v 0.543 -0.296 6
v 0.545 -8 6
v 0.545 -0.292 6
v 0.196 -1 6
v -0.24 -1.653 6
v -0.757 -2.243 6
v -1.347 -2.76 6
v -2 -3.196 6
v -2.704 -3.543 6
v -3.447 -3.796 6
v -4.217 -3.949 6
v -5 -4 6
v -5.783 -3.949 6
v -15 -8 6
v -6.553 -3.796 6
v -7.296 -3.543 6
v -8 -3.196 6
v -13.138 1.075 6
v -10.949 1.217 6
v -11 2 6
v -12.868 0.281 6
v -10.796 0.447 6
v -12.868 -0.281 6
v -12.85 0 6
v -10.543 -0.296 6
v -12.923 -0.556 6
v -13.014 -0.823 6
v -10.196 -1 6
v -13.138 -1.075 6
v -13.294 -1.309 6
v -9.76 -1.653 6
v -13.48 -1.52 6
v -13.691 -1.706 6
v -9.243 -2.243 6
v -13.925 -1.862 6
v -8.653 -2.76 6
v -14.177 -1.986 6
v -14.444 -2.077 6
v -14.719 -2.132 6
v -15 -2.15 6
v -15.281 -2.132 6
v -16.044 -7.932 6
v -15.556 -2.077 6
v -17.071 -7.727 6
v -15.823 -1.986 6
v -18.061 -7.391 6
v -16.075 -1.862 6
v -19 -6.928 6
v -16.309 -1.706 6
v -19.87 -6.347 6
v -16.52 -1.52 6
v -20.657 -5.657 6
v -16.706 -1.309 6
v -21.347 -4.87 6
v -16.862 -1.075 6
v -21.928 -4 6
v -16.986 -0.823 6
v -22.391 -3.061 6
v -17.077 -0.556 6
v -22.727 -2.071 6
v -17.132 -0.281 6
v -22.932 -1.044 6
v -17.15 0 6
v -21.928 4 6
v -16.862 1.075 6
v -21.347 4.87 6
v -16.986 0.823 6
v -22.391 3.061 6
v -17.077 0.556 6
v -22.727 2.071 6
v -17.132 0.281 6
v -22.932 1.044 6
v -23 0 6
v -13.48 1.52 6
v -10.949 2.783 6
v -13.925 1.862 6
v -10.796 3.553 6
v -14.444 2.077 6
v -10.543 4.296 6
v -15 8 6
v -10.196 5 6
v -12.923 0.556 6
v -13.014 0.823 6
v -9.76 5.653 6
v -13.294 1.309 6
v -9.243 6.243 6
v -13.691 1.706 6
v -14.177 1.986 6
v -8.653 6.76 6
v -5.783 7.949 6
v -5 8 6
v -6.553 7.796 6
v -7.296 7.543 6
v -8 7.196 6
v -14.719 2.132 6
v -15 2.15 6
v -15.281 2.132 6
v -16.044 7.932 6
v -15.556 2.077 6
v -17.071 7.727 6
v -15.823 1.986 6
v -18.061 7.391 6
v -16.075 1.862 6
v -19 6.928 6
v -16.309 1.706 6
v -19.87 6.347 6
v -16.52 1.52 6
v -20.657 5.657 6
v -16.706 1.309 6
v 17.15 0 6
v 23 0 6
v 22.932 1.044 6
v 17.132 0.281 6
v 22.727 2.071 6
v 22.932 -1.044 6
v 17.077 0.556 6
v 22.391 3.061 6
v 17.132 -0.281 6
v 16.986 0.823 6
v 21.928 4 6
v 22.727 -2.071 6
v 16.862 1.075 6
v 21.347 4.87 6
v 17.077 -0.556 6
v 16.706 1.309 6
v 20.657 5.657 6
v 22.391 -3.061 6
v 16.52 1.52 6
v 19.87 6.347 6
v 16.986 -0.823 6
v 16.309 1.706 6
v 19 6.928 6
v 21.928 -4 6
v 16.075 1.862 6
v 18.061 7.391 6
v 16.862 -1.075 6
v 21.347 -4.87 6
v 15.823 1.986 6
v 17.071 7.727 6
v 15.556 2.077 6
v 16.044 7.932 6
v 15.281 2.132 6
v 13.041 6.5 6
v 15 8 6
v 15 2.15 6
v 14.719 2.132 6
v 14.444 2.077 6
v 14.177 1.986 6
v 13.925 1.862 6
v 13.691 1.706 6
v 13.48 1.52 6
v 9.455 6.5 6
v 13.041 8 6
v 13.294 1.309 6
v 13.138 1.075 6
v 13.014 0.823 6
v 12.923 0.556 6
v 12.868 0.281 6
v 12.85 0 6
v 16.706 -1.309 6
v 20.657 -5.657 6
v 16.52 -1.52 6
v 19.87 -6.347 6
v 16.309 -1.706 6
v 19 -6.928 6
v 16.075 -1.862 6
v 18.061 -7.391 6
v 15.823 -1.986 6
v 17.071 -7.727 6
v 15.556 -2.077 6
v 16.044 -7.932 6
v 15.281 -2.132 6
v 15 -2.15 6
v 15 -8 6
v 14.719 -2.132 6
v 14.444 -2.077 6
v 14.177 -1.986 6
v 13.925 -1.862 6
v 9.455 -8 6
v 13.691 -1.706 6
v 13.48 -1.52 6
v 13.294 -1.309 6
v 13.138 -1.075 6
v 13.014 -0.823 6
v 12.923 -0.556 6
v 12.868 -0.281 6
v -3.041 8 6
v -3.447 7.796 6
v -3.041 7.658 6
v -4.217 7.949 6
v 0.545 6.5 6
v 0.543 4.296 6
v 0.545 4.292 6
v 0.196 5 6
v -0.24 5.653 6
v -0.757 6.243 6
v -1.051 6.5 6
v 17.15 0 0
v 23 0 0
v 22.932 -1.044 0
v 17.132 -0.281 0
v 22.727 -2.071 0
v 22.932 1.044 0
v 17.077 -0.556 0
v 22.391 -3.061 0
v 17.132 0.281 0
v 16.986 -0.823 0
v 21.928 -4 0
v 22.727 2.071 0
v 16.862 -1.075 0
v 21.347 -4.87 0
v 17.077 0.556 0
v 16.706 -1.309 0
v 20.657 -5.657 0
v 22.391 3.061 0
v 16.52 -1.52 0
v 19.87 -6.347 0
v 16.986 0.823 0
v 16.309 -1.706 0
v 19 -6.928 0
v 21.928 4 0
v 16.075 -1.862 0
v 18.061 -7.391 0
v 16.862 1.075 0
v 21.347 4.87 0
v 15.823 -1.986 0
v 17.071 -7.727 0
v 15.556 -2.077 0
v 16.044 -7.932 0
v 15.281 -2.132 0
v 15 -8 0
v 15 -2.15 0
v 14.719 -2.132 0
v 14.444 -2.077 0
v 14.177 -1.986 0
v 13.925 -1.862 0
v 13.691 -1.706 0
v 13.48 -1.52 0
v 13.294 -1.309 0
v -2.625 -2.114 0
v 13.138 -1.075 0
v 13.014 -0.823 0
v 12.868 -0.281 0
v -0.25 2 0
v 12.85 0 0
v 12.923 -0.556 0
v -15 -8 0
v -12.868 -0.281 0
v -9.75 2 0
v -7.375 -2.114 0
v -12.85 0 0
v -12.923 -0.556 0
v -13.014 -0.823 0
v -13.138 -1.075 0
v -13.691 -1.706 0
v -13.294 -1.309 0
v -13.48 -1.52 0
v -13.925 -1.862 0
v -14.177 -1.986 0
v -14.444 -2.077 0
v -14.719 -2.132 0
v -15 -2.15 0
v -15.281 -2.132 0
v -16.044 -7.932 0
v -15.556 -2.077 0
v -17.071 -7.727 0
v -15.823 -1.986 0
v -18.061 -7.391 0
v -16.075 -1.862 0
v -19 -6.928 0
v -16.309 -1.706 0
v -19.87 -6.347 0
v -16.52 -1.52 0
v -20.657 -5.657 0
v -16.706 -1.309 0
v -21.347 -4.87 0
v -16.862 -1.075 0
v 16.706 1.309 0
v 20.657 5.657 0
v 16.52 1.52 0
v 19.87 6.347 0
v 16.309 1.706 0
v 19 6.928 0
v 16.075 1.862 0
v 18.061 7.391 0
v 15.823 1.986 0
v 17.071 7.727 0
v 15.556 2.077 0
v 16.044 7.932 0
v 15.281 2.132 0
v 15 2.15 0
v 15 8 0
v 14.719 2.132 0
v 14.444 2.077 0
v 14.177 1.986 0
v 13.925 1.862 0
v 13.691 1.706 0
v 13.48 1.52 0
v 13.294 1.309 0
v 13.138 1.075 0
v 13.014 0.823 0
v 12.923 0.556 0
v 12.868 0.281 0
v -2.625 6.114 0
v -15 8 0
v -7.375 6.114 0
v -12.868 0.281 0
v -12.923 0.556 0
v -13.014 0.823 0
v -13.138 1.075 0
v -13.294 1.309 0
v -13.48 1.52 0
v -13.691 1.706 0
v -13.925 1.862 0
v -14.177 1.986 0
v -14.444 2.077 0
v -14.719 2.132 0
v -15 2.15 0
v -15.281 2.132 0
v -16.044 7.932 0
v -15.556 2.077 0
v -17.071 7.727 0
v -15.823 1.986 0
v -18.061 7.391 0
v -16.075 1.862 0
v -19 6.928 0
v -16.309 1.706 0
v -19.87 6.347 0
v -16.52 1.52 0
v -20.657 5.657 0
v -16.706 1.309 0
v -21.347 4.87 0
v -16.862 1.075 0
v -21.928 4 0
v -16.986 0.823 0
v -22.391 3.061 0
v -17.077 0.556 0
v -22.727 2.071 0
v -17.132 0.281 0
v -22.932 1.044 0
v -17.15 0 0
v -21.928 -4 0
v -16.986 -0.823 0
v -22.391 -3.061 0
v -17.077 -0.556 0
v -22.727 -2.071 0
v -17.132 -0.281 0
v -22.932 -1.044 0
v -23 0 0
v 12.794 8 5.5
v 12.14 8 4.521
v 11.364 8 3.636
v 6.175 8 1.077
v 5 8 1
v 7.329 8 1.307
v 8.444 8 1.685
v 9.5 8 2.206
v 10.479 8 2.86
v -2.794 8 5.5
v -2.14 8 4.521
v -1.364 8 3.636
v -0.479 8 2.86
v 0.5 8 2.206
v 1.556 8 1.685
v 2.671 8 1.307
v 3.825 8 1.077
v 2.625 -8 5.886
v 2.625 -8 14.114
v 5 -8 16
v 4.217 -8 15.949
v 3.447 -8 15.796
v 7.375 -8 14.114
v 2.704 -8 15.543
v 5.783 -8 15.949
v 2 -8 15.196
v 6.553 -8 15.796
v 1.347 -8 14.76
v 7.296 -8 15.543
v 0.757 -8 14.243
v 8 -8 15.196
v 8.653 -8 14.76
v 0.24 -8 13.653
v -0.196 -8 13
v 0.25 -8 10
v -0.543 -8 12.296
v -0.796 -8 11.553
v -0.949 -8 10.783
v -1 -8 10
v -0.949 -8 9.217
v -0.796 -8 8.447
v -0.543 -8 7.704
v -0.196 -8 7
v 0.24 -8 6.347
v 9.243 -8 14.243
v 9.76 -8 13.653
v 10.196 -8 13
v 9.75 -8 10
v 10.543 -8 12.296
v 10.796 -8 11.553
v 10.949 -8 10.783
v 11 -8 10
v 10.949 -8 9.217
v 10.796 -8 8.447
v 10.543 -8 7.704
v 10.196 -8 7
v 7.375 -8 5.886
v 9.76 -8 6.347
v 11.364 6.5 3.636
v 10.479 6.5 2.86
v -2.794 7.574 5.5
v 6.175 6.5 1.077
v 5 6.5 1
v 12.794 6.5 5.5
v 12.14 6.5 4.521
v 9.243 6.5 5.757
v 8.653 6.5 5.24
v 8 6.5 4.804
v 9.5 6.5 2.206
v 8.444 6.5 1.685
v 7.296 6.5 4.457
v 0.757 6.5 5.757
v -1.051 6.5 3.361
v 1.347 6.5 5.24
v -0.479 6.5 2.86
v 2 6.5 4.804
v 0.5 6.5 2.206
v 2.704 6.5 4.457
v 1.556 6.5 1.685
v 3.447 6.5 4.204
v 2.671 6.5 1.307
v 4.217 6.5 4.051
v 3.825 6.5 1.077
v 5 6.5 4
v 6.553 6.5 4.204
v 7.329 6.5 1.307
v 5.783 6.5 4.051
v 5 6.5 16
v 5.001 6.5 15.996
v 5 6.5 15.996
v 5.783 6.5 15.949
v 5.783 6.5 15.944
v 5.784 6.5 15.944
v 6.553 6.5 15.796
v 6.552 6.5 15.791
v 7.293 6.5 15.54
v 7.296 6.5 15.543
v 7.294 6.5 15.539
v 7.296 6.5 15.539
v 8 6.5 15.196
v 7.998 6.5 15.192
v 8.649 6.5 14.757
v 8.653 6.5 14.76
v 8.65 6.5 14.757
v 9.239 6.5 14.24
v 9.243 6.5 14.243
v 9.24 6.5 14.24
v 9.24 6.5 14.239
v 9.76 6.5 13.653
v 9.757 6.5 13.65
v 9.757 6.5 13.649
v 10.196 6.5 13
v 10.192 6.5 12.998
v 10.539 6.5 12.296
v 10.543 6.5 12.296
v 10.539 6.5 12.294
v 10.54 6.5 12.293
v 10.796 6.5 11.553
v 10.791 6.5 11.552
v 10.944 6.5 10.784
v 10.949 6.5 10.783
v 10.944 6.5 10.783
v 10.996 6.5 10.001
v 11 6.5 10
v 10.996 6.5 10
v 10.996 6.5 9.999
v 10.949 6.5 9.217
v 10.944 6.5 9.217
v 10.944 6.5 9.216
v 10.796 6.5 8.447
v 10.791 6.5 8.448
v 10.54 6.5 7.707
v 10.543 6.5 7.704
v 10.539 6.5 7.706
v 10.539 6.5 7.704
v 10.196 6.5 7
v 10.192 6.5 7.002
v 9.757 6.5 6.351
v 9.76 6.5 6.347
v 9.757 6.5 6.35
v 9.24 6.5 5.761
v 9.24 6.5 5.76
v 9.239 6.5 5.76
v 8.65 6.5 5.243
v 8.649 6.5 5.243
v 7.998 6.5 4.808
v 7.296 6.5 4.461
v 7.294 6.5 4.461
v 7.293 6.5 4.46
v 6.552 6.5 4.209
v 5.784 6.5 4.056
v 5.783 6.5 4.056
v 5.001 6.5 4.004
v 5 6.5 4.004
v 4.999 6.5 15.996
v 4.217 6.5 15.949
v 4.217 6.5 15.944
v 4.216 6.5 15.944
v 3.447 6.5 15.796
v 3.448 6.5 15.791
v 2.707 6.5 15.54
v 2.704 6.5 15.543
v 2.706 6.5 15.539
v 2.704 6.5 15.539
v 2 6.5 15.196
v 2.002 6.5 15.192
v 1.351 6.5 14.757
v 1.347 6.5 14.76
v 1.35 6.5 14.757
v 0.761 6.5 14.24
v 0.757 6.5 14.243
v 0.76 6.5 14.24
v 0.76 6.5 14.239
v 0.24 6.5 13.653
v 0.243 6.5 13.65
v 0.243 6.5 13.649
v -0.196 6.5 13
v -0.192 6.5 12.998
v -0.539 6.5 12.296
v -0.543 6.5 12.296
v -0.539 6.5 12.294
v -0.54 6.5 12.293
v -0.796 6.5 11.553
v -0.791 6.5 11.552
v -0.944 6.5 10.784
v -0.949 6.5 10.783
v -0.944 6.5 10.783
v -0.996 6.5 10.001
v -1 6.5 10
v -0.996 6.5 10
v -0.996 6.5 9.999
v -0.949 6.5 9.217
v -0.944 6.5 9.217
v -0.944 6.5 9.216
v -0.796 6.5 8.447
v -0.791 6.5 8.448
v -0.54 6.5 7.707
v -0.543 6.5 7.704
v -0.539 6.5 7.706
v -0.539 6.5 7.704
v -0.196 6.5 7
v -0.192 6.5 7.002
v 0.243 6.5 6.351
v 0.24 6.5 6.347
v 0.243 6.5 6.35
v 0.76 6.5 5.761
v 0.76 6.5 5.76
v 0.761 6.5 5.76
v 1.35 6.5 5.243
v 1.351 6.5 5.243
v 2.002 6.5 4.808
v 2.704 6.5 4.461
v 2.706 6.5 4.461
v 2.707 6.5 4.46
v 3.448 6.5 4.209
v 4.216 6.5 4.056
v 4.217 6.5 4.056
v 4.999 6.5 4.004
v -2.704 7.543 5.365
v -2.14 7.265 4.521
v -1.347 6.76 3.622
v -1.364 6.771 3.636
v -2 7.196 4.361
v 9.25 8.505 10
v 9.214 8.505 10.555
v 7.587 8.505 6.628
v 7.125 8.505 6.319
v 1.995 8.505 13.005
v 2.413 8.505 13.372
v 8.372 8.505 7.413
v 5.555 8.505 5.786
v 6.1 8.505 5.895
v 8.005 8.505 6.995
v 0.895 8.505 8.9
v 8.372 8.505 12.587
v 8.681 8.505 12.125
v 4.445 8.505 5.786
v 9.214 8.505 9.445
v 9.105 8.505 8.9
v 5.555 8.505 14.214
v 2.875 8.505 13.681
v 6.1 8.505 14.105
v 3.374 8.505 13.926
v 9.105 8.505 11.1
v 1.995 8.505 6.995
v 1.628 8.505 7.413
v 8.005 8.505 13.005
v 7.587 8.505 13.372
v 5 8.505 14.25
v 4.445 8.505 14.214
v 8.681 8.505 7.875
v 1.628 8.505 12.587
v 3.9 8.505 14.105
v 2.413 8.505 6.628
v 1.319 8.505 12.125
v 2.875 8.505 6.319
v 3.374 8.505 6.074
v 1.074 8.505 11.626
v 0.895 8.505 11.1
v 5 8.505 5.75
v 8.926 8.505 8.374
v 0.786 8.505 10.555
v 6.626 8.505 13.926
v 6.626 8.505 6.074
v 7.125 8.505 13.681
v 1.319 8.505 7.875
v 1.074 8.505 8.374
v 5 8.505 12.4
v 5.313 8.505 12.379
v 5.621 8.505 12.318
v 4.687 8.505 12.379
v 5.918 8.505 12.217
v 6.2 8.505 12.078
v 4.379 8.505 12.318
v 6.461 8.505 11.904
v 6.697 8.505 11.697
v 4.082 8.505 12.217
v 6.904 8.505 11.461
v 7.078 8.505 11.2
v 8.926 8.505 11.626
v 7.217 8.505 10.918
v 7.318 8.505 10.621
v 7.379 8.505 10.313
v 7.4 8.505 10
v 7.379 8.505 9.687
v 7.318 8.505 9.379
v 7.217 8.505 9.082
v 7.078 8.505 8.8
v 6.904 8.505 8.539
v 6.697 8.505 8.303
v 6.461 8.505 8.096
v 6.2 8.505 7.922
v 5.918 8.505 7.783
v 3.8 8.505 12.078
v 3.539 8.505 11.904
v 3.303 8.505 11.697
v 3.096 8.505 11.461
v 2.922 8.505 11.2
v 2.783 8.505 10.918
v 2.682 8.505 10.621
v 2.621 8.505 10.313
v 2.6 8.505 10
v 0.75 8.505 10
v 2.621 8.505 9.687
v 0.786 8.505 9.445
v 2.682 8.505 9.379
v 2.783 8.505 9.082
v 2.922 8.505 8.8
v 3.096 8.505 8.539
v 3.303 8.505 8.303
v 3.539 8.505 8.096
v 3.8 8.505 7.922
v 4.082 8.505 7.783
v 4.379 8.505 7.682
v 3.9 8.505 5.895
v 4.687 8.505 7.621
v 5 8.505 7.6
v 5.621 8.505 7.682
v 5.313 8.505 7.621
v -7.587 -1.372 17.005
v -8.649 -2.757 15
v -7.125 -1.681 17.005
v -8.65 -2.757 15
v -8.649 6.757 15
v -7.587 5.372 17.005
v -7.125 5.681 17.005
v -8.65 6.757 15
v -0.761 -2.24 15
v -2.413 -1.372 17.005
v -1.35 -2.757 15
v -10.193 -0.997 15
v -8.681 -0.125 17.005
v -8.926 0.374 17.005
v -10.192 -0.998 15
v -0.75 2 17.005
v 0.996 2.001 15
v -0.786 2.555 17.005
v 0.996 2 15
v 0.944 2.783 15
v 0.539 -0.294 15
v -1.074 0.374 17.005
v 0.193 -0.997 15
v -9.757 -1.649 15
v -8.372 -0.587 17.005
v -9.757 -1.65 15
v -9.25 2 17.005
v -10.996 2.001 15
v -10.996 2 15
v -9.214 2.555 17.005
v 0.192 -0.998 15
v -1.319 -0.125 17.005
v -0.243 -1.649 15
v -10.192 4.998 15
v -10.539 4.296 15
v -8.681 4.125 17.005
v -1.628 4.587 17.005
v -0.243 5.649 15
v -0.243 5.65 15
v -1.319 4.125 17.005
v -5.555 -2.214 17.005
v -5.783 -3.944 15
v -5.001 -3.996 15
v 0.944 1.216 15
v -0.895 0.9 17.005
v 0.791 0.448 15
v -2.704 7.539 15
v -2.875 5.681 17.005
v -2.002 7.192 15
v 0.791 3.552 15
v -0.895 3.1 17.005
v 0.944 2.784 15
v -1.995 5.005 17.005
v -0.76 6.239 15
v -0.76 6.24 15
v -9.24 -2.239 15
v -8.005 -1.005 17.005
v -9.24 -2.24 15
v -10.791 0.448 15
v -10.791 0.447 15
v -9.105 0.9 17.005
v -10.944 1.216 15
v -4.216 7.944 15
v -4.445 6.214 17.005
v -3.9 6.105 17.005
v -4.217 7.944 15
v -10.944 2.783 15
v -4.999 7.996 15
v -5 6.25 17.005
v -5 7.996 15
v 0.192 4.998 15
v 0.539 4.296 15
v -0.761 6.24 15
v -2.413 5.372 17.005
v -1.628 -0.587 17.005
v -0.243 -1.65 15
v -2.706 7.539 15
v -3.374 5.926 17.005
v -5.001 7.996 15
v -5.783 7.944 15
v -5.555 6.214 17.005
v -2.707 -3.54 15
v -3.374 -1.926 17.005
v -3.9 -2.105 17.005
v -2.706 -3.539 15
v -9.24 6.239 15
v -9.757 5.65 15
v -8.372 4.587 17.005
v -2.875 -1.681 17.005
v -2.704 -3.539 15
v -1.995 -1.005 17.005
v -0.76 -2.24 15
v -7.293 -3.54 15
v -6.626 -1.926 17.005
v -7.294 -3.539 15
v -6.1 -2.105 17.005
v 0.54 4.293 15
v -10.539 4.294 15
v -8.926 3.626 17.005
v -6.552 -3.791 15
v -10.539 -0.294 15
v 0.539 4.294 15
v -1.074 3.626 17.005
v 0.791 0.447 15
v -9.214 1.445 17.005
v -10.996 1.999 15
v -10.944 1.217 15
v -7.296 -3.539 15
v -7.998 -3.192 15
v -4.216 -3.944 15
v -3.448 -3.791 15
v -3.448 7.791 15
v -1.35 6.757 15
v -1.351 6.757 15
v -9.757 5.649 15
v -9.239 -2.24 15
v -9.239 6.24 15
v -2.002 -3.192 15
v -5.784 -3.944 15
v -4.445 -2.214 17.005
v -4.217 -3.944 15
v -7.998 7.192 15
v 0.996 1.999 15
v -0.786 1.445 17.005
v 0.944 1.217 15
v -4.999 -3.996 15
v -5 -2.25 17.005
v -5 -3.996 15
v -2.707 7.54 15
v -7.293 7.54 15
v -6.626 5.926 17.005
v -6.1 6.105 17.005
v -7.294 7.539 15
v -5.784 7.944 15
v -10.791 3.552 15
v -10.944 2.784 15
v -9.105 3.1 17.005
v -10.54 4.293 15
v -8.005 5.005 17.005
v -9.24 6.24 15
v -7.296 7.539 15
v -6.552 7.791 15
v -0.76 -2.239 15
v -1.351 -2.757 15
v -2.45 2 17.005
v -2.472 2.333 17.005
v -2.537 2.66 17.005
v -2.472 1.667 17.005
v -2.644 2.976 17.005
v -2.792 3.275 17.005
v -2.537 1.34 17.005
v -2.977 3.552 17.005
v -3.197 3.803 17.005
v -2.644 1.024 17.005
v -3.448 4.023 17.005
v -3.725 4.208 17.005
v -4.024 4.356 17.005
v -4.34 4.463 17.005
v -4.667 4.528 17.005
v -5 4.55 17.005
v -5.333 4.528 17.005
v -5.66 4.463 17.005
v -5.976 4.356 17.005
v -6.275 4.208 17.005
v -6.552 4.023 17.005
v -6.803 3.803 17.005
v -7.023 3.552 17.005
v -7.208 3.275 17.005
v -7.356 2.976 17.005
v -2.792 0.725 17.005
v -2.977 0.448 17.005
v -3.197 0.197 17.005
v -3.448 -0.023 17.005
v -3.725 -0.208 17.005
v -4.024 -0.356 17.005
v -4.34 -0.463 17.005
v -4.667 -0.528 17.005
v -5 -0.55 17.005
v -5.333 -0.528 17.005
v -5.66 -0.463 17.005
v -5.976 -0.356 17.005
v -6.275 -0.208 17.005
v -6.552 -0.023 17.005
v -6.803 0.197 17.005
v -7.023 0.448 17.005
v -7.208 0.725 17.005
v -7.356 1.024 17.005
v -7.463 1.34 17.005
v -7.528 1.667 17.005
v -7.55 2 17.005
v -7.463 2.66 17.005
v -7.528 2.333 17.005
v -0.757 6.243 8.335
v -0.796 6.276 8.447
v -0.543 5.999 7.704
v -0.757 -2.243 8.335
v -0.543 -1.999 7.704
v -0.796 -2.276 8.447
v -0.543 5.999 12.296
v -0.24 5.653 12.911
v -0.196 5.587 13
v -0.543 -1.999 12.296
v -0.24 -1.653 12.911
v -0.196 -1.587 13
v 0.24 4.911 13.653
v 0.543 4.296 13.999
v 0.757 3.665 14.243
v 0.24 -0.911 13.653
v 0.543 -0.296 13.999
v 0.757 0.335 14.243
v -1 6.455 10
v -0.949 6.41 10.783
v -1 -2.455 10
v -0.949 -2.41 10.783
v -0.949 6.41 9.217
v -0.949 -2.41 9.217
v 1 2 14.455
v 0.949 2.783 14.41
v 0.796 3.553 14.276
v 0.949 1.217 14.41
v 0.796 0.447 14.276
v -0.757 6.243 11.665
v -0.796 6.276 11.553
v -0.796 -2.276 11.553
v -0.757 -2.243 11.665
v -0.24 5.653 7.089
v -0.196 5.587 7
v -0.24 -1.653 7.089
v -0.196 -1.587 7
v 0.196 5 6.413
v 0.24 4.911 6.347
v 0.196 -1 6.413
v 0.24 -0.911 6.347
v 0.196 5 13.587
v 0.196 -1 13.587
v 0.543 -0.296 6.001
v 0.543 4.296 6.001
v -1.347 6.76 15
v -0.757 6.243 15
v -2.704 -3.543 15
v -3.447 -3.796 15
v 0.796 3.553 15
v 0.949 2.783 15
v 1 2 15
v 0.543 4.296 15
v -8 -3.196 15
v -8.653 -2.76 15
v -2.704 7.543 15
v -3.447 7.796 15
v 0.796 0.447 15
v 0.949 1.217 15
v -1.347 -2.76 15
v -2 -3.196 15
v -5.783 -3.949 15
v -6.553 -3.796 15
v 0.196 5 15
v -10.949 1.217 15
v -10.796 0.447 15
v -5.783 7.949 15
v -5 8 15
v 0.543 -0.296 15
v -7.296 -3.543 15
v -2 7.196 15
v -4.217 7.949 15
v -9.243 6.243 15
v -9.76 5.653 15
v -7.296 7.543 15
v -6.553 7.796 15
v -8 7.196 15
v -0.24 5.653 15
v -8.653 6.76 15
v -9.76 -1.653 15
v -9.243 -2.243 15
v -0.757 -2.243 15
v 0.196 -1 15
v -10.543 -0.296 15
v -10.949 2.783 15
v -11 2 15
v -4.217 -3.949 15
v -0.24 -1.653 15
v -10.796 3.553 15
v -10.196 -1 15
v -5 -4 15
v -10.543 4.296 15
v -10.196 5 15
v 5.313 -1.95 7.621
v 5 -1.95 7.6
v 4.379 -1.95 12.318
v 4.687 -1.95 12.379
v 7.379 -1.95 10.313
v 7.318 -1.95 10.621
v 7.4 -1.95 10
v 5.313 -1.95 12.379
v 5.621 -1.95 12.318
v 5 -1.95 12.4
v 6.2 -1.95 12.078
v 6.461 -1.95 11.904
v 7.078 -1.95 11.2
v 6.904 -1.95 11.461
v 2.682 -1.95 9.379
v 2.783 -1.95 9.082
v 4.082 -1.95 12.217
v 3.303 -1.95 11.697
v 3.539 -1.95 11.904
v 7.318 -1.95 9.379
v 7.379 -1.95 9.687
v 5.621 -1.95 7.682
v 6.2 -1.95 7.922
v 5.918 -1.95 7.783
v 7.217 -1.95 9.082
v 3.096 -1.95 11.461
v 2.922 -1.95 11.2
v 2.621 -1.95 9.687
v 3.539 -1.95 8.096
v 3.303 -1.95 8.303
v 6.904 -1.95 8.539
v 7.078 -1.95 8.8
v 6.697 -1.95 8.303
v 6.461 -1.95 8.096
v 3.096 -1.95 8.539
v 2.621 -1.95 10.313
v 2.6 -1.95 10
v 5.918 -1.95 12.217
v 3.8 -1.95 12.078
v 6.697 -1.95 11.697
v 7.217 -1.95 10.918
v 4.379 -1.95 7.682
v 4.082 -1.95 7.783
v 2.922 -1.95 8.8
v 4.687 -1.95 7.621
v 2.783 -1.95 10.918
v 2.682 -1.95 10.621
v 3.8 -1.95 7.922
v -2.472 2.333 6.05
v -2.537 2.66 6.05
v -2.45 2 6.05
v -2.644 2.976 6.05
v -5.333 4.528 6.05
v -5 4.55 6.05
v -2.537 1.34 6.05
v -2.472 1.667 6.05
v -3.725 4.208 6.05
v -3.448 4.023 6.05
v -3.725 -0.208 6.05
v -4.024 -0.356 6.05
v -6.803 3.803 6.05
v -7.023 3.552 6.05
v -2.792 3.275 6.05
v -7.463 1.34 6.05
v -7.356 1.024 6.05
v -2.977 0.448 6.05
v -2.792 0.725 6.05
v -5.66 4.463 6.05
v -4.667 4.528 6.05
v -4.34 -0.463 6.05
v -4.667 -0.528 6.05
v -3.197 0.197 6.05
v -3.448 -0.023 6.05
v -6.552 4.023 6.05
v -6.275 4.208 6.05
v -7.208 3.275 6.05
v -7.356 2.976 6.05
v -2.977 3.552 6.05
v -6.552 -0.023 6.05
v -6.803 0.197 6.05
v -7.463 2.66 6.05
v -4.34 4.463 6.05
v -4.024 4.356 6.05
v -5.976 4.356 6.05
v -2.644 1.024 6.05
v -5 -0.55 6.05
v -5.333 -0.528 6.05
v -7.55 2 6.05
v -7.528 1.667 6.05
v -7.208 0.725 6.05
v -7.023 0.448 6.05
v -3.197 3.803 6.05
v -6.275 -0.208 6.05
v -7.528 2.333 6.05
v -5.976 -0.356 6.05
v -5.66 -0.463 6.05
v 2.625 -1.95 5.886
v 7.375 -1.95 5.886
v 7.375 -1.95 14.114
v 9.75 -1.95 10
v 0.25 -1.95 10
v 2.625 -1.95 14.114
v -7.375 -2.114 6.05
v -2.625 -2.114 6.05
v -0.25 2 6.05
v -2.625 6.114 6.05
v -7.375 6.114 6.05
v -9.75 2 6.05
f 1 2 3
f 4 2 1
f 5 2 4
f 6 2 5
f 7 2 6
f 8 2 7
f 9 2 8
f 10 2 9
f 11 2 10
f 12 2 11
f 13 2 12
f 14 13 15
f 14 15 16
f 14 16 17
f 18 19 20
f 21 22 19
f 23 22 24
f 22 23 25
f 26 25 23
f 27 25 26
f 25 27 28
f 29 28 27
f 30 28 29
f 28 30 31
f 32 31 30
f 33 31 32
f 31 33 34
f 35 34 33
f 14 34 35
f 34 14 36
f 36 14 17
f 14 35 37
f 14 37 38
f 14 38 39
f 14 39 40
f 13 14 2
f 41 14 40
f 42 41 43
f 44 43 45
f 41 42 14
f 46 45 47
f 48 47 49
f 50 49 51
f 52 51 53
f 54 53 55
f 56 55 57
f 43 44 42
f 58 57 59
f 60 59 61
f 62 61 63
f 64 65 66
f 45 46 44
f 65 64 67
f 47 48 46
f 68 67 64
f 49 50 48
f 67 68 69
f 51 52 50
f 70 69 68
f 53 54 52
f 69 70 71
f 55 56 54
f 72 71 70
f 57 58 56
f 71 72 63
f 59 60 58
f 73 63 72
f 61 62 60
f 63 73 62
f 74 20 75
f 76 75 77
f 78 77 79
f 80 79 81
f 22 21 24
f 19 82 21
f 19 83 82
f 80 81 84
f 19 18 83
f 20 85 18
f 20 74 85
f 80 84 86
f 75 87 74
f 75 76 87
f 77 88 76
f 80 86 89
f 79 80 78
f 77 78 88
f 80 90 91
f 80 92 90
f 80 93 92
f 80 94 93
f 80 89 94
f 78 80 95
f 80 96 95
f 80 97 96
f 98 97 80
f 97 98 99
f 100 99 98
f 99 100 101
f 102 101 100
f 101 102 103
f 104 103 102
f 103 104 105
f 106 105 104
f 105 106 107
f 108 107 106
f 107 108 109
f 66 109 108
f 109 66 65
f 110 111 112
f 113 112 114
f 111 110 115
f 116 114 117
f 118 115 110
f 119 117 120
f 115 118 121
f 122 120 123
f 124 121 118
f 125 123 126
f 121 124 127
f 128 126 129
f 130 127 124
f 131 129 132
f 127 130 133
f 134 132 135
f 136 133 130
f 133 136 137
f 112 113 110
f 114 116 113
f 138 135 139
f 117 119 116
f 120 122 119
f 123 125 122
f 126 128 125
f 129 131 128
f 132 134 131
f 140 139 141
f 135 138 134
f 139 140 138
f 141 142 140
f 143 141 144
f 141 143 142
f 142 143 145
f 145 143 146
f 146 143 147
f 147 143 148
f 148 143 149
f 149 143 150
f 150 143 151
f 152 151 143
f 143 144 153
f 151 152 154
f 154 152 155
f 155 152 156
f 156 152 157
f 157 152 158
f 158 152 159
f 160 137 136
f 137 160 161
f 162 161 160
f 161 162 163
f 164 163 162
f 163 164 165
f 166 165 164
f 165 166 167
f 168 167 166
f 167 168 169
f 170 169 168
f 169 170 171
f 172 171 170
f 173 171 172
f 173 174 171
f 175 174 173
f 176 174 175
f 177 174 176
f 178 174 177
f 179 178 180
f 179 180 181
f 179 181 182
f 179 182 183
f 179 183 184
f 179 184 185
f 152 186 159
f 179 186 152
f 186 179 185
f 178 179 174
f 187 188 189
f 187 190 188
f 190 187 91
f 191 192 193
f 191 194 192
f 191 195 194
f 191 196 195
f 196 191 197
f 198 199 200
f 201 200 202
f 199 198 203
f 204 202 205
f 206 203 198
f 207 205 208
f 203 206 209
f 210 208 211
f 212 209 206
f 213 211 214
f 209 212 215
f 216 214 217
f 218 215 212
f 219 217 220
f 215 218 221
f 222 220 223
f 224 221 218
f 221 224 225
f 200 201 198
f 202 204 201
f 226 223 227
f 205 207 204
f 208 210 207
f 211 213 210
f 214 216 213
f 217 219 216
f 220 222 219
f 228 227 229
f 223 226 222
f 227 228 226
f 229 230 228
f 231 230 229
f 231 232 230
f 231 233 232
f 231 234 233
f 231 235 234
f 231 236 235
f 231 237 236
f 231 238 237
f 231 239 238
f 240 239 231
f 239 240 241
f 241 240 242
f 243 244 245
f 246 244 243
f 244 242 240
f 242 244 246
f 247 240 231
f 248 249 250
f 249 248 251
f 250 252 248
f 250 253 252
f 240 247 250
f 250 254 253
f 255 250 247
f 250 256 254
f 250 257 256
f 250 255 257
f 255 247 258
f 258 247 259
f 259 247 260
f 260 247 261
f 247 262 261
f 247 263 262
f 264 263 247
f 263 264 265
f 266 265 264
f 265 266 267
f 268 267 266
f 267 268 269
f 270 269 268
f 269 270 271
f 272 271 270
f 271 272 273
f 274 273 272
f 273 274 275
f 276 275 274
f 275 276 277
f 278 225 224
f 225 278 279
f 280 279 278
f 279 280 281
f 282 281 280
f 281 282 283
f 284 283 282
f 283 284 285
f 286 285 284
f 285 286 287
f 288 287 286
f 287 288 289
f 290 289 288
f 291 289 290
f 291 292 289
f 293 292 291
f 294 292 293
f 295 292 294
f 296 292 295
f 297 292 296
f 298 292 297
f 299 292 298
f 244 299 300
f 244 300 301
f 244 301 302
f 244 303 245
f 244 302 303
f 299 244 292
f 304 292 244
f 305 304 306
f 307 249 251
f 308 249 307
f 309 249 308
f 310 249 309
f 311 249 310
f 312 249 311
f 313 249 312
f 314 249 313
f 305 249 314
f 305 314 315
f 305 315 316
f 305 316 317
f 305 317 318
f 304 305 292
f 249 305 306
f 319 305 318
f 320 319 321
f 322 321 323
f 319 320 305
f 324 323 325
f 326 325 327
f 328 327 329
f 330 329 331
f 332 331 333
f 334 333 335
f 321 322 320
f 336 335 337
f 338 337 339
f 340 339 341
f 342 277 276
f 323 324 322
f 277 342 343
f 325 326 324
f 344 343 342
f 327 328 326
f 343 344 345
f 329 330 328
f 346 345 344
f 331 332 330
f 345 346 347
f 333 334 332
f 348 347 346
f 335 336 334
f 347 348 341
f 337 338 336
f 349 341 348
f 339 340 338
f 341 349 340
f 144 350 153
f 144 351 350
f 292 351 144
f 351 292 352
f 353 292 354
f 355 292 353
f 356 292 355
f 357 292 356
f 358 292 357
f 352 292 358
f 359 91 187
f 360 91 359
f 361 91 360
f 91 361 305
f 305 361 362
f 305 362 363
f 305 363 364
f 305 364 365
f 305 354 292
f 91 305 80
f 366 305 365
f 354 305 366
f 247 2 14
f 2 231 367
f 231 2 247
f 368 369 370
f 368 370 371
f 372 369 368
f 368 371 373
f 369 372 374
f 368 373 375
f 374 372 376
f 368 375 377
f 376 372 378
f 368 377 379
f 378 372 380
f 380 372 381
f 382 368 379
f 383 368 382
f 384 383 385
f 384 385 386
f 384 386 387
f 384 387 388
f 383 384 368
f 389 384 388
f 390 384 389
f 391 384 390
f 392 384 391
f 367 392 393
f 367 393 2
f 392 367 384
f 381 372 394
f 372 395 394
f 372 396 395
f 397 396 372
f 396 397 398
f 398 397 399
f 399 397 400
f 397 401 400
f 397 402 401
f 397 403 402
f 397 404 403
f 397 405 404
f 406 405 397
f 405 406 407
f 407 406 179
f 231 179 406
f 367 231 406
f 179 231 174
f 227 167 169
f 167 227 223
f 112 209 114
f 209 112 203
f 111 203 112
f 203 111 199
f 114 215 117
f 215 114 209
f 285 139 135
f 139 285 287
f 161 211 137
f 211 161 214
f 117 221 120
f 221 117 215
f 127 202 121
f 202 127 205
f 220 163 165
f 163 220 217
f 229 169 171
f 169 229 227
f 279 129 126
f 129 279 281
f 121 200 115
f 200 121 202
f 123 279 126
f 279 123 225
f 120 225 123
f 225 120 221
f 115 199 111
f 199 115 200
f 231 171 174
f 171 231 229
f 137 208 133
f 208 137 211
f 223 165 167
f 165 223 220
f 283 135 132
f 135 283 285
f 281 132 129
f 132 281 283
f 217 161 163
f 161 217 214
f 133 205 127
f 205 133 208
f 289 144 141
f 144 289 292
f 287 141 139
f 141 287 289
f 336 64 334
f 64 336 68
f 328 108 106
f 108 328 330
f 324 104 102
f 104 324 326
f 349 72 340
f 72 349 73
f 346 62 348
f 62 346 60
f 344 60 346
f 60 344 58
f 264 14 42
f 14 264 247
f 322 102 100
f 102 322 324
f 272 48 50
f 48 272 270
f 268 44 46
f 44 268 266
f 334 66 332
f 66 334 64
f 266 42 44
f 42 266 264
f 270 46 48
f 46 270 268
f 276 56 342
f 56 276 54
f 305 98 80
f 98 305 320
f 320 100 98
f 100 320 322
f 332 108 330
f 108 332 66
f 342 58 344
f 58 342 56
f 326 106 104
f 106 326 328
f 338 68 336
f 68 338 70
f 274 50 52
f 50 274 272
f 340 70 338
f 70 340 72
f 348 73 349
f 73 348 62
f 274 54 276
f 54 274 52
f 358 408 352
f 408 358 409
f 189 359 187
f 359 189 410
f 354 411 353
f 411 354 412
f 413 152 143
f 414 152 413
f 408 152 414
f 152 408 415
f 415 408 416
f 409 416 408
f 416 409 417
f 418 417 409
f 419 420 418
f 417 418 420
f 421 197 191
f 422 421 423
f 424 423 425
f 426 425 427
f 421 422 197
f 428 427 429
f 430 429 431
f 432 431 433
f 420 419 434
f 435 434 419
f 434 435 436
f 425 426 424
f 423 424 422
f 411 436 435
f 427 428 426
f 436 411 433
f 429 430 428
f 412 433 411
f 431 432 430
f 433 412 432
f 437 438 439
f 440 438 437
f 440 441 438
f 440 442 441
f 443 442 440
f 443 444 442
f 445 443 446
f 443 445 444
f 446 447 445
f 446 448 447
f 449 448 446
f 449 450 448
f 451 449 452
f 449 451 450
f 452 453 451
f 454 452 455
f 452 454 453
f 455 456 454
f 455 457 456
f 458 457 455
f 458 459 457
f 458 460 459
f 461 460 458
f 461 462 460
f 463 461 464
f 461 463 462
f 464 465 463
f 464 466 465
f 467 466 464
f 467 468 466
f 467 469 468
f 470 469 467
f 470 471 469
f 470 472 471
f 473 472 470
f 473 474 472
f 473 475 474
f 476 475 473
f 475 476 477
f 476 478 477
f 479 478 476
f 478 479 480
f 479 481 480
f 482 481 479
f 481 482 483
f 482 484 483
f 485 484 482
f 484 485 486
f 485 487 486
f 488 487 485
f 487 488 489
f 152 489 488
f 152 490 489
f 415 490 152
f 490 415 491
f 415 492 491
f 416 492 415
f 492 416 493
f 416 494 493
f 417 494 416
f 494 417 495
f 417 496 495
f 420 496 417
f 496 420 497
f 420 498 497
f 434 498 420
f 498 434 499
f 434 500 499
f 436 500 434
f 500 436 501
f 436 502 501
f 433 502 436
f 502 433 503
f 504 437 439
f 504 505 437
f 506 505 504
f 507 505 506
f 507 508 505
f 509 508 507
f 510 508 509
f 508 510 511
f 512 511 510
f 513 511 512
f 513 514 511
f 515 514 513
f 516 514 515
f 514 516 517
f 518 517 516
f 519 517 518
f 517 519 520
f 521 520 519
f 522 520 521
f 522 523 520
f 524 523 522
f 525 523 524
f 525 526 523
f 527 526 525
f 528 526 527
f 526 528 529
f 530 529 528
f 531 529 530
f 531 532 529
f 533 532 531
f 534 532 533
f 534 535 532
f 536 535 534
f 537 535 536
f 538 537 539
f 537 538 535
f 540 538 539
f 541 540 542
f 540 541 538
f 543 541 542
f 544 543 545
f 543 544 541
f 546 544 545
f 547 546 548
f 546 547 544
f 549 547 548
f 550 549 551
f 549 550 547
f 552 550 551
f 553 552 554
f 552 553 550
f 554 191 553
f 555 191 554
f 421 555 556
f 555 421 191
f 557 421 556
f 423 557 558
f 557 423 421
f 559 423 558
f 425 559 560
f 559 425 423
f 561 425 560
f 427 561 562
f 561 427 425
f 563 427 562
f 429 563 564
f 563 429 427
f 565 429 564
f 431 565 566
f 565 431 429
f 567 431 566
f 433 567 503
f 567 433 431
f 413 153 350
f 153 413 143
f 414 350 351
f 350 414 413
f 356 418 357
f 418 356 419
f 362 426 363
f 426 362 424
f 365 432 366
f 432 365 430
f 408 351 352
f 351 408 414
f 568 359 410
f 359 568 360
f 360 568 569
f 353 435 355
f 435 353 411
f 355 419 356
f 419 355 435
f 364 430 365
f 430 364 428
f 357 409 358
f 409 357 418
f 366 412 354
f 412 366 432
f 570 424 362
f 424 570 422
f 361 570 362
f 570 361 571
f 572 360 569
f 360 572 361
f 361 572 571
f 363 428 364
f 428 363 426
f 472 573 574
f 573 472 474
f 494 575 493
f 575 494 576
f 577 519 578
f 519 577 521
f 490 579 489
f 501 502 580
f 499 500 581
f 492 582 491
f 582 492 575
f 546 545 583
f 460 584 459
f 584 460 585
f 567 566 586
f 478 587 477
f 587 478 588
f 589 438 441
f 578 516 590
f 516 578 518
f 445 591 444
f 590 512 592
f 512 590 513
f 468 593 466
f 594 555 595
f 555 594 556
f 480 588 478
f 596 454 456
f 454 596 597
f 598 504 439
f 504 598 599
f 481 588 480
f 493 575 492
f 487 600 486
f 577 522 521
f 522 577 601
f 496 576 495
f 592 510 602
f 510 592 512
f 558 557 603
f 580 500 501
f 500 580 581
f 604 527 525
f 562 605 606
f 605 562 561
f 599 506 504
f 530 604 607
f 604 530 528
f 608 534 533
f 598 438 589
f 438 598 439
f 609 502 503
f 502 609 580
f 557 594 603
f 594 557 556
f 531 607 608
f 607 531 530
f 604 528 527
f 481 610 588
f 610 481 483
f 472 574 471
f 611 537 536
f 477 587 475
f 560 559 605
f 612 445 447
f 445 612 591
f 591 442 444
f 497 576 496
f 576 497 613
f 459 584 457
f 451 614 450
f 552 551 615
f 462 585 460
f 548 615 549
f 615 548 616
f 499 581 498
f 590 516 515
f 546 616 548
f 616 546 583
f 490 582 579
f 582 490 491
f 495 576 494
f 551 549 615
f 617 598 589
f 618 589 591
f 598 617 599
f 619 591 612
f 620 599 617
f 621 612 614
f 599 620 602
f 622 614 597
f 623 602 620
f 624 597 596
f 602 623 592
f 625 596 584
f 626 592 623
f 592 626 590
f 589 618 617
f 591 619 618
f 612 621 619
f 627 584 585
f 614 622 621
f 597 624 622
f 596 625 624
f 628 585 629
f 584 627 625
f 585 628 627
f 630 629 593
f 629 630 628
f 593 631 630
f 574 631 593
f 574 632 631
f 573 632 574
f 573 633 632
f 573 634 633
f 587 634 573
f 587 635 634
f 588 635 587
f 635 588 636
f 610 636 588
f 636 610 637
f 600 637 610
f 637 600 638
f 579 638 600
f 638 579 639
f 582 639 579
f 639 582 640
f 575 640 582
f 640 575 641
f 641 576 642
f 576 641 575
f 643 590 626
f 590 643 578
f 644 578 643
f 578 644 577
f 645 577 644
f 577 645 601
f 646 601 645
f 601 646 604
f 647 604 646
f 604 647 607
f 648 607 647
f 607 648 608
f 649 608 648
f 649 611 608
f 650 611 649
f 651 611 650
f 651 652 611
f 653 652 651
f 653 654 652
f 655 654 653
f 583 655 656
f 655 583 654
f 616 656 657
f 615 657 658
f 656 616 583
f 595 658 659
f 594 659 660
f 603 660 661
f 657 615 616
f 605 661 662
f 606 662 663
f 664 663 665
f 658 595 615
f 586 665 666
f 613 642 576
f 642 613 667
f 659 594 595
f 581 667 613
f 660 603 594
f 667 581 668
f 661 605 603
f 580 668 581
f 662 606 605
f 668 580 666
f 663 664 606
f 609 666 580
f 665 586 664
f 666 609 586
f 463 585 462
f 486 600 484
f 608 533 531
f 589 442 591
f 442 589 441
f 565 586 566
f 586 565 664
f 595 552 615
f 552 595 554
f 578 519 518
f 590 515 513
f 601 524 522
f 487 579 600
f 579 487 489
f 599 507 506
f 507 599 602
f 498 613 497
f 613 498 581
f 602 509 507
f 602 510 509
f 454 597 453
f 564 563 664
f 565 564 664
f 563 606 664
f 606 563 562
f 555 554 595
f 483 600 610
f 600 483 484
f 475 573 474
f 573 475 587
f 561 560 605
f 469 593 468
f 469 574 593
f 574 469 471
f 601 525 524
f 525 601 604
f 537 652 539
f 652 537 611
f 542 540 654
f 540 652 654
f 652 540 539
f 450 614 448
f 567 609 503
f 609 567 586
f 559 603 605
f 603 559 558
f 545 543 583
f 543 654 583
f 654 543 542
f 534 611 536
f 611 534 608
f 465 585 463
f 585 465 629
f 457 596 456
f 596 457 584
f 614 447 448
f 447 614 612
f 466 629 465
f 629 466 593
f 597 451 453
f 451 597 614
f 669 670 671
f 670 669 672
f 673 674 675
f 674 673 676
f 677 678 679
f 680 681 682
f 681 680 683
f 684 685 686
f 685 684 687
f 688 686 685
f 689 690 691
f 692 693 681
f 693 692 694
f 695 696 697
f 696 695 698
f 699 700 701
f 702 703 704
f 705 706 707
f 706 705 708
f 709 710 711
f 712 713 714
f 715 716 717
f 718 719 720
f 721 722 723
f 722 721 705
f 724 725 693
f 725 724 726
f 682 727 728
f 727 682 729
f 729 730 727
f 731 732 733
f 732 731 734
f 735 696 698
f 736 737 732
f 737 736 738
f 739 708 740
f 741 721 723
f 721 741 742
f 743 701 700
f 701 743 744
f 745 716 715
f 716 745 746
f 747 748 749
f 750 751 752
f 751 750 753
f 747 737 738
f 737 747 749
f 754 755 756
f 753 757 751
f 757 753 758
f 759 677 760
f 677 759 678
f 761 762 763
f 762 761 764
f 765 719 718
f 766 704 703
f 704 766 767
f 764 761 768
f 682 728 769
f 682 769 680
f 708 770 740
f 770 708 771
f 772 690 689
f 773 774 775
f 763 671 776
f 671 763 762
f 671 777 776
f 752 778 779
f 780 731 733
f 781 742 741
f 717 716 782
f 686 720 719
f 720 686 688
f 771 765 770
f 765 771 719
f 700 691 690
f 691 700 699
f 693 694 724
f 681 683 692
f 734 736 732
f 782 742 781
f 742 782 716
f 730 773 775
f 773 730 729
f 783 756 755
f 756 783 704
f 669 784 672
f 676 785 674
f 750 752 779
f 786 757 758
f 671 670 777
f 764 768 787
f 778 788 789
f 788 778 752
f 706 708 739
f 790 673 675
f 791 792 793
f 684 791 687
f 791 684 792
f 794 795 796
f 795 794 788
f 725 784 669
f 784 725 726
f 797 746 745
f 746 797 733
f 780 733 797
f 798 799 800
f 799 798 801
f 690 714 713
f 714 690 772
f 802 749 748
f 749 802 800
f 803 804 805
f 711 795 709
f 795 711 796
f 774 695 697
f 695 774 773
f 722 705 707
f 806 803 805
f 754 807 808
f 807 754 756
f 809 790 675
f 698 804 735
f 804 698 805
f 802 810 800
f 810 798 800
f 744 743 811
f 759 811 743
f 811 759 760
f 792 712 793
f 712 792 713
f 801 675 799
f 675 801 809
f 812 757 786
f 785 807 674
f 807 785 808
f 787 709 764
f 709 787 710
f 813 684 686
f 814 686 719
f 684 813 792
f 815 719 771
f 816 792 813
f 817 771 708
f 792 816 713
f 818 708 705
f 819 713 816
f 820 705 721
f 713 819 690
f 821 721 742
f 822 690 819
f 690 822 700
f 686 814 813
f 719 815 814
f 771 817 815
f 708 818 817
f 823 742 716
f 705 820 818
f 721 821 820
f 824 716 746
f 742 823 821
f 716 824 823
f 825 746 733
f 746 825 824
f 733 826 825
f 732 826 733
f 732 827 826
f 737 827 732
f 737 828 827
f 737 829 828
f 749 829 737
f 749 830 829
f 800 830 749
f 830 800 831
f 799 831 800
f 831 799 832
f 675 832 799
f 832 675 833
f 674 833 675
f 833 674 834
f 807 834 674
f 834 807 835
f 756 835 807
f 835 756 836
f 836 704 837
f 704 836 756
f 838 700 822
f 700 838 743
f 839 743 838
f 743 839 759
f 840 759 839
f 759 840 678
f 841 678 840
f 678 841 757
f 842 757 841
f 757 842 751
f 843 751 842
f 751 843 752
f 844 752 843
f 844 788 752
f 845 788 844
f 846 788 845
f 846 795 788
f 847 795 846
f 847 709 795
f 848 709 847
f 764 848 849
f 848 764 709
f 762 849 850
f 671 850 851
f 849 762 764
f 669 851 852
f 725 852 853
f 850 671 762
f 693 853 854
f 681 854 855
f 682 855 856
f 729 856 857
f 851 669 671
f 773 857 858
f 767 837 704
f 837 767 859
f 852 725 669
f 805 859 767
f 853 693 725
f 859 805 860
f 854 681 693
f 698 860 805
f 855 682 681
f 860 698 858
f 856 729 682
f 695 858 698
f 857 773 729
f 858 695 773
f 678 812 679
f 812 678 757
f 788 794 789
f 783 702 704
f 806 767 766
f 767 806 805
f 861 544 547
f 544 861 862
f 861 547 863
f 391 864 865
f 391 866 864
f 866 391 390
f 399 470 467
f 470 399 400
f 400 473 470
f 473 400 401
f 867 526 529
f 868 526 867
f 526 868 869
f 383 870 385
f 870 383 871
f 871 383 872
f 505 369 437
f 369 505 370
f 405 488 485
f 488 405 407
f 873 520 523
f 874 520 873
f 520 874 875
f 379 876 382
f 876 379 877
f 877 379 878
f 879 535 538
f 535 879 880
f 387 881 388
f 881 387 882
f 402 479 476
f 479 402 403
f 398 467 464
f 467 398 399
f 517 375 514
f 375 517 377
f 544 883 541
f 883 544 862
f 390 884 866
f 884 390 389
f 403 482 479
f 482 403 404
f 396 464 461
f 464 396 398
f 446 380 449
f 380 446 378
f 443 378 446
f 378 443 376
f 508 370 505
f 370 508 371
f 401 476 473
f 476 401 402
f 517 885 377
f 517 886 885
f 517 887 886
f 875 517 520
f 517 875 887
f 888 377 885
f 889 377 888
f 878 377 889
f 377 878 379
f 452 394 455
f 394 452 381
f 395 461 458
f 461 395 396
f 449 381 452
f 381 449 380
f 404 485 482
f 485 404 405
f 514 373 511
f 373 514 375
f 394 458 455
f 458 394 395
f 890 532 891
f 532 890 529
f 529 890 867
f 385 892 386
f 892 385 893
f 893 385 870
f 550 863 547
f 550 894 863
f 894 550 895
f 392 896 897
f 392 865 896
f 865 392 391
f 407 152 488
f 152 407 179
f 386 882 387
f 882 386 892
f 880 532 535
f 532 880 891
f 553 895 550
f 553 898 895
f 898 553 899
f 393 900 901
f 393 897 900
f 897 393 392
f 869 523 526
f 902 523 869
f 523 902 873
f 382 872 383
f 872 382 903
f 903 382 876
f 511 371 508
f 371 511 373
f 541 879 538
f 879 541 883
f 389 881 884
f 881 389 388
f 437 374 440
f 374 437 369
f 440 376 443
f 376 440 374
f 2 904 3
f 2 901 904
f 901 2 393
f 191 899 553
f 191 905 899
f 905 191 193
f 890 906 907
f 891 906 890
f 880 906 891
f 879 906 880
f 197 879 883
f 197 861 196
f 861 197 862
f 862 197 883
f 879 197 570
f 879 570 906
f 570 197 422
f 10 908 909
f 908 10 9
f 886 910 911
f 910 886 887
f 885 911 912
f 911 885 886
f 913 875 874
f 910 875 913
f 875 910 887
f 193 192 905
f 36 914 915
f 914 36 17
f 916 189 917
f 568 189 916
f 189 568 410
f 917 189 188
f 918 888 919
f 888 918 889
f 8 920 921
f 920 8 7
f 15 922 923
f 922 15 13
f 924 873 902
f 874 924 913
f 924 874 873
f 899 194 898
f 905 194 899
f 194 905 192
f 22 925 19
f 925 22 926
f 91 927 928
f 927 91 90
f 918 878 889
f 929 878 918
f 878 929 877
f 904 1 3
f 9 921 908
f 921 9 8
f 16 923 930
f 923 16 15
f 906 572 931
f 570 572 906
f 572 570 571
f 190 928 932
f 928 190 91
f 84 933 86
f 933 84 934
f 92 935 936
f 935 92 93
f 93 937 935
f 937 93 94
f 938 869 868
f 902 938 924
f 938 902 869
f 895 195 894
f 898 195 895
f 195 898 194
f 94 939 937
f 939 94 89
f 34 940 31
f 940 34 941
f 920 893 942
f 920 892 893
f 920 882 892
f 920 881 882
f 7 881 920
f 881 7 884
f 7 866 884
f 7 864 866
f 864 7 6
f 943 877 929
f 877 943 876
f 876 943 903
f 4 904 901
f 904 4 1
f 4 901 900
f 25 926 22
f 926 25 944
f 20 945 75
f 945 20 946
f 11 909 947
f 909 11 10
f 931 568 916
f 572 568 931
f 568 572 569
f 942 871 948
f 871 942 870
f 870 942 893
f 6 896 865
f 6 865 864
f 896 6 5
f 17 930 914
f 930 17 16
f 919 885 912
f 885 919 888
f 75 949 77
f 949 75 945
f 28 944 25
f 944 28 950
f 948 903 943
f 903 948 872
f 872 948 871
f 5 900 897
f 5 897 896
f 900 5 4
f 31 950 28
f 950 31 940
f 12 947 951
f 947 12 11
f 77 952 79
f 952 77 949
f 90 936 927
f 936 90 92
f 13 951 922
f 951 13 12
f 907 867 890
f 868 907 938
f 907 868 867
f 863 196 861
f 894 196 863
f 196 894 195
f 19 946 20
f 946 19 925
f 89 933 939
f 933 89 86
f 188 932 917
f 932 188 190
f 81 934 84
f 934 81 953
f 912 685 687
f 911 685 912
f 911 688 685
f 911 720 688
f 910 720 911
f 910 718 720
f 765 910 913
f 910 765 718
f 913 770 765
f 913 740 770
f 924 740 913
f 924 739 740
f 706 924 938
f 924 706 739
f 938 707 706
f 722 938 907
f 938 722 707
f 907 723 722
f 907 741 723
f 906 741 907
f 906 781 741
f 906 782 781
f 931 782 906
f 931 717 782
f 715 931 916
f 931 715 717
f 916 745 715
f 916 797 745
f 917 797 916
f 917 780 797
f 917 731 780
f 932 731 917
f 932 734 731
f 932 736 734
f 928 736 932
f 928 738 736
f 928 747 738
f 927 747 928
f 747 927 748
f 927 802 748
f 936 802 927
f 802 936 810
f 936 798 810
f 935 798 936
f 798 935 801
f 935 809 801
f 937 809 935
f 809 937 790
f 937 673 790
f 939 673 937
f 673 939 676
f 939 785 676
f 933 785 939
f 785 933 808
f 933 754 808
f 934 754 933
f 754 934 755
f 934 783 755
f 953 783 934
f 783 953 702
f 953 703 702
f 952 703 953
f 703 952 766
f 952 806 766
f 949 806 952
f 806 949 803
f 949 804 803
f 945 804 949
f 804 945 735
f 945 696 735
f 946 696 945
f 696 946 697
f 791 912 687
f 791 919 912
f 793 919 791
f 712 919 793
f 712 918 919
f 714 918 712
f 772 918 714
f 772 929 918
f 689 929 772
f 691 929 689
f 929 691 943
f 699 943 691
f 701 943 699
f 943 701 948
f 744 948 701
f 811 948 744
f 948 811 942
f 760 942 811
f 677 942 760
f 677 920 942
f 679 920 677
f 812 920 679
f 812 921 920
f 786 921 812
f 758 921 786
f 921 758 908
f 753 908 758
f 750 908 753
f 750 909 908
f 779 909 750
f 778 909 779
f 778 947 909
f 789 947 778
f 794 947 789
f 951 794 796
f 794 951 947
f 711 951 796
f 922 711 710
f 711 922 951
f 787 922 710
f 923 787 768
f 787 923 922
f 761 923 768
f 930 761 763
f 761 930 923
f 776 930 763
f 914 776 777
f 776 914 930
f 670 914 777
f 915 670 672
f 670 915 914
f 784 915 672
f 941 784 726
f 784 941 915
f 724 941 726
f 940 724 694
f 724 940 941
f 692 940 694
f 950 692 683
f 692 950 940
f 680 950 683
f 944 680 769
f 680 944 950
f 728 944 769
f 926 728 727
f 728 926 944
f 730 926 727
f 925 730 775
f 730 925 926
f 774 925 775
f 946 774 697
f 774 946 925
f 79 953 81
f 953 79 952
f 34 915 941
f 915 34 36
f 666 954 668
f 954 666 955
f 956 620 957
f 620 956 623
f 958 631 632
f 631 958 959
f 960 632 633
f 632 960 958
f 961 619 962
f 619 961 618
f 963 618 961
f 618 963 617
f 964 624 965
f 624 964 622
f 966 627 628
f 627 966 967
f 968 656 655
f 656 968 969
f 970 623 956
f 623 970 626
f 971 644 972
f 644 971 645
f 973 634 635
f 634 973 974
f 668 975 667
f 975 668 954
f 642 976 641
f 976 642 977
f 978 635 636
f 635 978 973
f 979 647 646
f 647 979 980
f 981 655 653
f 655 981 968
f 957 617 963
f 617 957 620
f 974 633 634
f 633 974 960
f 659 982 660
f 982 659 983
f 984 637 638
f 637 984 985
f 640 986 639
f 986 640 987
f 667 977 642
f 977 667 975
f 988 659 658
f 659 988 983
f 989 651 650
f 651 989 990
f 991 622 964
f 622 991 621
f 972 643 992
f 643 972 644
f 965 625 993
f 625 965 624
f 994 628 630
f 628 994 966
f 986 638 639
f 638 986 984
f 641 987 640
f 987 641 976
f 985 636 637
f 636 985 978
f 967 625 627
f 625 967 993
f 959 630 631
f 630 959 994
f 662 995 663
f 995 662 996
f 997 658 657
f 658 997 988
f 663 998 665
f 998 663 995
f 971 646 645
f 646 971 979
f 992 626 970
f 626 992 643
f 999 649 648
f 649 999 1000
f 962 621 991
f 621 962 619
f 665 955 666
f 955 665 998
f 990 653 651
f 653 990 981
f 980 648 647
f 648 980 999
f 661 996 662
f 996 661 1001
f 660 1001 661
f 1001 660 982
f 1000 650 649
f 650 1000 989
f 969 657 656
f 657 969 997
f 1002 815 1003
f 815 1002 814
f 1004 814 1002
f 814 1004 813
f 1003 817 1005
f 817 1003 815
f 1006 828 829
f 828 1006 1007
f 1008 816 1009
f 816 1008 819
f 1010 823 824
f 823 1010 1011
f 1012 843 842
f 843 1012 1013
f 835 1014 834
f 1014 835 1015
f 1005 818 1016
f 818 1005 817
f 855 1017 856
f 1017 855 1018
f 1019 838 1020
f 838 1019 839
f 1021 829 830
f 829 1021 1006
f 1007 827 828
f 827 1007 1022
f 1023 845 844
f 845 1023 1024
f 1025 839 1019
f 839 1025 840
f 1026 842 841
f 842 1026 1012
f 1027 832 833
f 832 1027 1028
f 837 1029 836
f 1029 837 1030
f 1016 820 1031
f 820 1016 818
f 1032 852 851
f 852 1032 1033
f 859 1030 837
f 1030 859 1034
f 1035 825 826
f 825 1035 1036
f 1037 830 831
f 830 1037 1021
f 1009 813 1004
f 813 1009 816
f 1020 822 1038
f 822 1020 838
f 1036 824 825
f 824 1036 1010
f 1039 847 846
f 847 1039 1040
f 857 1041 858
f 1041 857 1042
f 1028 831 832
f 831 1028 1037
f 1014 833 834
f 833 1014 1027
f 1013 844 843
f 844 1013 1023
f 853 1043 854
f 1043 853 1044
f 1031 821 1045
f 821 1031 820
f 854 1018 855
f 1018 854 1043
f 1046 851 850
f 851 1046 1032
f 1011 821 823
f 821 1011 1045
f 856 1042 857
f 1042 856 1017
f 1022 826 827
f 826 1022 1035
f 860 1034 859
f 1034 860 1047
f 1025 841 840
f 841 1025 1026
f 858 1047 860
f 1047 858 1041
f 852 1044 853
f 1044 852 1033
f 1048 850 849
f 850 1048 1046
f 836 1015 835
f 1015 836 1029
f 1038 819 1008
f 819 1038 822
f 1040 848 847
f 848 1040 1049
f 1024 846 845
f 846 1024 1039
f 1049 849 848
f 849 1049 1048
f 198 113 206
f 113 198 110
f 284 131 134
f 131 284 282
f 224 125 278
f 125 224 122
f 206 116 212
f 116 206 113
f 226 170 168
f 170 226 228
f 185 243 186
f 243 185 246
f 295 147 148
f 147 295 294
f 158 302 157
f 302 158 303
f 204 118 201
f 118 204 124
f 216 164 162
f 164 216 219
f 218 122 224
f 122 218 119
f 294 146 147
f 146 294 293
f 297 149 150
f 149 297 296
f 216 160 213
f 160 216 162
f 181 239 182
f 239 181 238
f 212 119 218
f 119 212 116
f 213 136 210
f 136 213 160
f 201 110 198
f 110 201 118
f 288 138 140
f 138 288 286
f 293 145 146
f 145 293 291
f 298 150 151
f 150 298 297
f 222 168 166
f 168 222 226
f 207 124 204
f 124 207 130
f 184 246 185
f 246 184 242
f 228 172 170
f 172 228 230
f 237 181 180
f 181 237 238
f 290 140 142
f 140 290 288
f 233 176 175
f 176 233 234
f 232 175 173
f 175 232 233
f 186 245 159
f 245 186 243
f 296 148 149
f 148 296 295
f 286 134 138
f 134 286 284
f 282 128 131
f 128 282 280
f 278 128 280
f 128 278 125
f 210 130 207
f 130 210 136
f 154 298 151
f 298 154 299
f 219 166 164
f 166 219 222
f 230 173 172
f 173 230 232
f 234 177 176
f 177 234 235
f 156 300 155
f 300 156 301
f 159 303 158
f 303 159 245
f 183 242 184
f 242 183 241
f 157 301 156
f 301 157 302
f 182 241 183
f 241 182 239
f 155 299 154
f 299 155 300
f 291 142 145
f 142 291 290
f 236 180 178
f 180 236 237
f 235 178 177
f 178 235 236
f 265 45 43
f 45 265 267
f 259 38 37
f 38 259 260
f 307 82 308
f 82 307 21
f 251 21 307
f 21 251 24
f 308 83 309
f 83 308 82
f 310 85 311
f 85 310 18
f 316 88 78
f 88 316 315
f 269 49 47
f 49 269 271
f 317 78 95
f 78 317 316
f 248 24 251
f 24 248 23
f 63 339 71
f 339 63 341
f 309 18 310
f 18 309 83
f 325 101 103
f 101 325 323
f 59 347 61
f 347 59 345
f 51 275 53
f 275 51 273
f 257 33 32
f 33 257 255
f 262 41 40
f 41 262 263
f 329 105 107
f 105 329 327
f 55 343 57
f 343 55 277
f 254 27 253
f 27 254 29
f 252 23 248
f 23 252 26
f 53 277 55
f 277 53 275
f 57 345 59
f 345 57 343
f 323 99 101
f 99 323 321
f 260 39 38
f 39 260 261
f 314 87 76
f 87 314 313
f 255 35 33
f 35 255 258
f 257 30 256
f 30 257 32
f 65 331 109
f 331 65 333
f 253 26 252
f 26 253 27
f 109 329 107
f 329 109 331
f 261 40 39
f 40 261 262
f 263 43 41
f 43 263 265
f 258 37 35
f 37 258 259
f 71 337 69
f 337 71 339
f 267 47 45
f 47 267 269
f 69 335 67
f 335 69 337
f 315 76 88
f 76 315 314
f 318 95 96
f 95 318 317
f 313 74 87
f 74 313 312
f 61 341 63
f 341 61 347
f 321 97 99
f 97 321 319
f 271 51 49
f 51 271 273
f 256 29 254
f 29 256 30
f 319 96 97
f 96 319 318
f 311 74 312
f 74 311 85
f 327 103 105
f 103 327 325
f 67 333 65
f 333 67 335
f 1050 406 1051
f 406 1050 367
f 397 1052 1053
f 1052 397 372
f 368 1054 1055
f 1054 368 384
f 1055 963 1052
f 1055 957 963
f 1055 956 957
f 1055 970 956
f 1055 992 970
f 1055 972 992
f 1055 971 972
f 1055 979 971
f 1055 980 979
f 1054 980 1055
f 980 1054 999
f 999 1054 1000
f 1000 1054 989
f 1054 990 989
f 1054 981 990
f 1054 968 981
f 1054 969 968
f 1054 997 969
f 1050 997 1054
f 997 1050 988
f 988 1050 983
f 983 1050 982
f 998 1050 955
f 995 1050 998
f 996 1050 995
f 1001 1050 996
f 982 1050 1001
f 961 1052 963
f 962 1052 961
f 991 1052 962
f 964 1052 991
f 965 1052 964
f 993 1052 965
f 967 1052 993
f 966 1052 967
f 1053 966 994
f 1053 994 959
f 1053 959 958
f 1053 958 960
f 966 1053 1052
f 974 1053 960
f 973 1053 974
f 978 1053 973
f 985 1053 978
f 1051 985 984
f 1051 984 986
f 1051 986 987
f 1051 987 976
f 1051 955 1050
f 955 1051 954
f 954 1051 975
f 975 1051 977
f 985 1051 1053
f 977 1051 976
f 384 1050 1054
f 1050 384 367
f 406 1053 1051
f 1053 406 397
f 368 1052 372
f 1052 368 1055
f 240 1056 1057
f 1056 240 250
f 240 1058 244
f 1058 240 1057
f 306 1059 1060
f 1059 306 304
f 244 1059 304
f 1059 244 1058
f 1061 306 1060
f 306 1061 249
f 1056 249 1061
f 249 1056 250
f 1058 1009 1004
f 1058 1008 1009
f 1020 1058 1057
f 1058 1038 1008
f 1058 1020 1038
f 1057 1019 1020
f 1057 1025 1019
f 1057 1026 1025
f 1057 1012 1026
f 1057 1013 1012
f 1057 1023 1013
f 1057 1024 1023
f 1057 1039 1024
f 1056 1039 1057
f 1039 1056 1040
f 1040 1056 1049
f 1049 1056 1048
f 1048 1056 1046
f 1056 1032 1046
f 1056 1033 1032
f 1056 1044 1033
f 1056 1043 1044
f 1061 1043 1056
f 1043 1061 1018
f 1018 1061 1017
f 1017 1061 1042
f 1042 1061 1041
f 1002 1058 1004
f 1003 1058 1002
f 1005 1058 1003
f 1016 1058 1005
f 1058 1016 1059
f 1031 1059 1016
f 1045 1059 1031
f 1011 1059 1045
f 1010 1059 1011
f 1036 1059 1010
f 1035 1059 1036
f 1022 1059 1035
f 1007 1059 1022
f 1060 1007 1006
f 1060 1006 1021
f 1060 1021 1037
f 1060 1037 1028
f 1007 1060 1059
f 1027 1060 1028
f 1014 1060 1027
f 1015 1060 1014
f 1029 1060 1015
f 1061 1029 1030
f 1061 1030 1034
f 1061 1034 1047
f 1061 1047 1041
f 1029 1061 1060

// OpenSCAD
/*
Info: 
You need >=3 of these holders to mount a filament role on the top of the printer.
Designed for:
- two 625ZZ-Bearings 
- two ## mm M5 Screws and nuts (optional) for the bearings
- two ## mm M4 Screws for mounting
*/

$fn=48;

module bearing(ID,OD,W) {
    // inner Diameter, outer diameter, width
    translate([0,0,W/2]) difference() {
    cylinder(d=OD, h=W, center=true);
    cylinder(d=ID, h=W+1, center=true);
    }
}

hF = 18; // height filament

module non_printable_parts() {
translate([+5,8.5, hF-8]) rotate([-90,0,0]) bearing(5,16,5);
translate([-5, 2,15+2]) rotate([00,0,0])   bearing(5,16,5);
translate([0,110,hF+1]) cylinder(d=200,h=2,center=true); // filament role, bottom
}


module groundplate(height) {
    union() {
translate([  0,0,height/2]) cube([30,16,height], center=true);
translate([+15,0,height/2]) cylinder(d=16,h=height,center=true);
translate([-15,0,height/2]) cylinder(d=16,h=height,center=true); 
}
}

module filament_holder() {
difference() {
    union() {
difference() {
groundplate(6);
translate([+5, +8.5, hF-8]) rotate([90,0,0]) cylinder(d=18,h= 4,center=true);
}

translate([+5, 7.5, hF-8]) rotate([90,0,0]) cylinder(d1=8.5, d2=12,h= 2.01,center=true);
translate([-5, 2.0, 15+1]) rotate([00,0,0]) cylinder(d2=8.5, d1=12,h= 2.01,center=true);
    
translate([+5, -0.75, hF-8]) rotate([90,0,0]) cylinder(d=12,h= 14.5,center=true);
translate([-5, +2.00, 7.5])  rotate([00,0,0]) cylinder(d=12,h=15,center=true);
}
translate([+5,10, hF-8]) rotate([90,0,0]) cylinder(d=4.8,h=50,center=true);
translate([-5, 2,   15]) rotate([00,0,0]) cylinder(d=5.1,h=50,center=true);

translate([+15, 0,0]) rotate([00,0,0]) cylinder(d=4.3,h=40,center=true);
translate([-15, 0,0]) rotate([00,0,0]) cylinder(d=4.3,h=40,center=true);

translate([+5, -5, hF-8]) rotate([90,0,0]) cylinder(d=9.5,h=6.1,center=true,$fn=6);
translate([-5, +2, 3])  rotate([00,0,0]) cylinder(d=9.5,h=6.1,center=true,$fn=6);

}
}

filament_holder();

// debug: 
//non_printable_parts();
